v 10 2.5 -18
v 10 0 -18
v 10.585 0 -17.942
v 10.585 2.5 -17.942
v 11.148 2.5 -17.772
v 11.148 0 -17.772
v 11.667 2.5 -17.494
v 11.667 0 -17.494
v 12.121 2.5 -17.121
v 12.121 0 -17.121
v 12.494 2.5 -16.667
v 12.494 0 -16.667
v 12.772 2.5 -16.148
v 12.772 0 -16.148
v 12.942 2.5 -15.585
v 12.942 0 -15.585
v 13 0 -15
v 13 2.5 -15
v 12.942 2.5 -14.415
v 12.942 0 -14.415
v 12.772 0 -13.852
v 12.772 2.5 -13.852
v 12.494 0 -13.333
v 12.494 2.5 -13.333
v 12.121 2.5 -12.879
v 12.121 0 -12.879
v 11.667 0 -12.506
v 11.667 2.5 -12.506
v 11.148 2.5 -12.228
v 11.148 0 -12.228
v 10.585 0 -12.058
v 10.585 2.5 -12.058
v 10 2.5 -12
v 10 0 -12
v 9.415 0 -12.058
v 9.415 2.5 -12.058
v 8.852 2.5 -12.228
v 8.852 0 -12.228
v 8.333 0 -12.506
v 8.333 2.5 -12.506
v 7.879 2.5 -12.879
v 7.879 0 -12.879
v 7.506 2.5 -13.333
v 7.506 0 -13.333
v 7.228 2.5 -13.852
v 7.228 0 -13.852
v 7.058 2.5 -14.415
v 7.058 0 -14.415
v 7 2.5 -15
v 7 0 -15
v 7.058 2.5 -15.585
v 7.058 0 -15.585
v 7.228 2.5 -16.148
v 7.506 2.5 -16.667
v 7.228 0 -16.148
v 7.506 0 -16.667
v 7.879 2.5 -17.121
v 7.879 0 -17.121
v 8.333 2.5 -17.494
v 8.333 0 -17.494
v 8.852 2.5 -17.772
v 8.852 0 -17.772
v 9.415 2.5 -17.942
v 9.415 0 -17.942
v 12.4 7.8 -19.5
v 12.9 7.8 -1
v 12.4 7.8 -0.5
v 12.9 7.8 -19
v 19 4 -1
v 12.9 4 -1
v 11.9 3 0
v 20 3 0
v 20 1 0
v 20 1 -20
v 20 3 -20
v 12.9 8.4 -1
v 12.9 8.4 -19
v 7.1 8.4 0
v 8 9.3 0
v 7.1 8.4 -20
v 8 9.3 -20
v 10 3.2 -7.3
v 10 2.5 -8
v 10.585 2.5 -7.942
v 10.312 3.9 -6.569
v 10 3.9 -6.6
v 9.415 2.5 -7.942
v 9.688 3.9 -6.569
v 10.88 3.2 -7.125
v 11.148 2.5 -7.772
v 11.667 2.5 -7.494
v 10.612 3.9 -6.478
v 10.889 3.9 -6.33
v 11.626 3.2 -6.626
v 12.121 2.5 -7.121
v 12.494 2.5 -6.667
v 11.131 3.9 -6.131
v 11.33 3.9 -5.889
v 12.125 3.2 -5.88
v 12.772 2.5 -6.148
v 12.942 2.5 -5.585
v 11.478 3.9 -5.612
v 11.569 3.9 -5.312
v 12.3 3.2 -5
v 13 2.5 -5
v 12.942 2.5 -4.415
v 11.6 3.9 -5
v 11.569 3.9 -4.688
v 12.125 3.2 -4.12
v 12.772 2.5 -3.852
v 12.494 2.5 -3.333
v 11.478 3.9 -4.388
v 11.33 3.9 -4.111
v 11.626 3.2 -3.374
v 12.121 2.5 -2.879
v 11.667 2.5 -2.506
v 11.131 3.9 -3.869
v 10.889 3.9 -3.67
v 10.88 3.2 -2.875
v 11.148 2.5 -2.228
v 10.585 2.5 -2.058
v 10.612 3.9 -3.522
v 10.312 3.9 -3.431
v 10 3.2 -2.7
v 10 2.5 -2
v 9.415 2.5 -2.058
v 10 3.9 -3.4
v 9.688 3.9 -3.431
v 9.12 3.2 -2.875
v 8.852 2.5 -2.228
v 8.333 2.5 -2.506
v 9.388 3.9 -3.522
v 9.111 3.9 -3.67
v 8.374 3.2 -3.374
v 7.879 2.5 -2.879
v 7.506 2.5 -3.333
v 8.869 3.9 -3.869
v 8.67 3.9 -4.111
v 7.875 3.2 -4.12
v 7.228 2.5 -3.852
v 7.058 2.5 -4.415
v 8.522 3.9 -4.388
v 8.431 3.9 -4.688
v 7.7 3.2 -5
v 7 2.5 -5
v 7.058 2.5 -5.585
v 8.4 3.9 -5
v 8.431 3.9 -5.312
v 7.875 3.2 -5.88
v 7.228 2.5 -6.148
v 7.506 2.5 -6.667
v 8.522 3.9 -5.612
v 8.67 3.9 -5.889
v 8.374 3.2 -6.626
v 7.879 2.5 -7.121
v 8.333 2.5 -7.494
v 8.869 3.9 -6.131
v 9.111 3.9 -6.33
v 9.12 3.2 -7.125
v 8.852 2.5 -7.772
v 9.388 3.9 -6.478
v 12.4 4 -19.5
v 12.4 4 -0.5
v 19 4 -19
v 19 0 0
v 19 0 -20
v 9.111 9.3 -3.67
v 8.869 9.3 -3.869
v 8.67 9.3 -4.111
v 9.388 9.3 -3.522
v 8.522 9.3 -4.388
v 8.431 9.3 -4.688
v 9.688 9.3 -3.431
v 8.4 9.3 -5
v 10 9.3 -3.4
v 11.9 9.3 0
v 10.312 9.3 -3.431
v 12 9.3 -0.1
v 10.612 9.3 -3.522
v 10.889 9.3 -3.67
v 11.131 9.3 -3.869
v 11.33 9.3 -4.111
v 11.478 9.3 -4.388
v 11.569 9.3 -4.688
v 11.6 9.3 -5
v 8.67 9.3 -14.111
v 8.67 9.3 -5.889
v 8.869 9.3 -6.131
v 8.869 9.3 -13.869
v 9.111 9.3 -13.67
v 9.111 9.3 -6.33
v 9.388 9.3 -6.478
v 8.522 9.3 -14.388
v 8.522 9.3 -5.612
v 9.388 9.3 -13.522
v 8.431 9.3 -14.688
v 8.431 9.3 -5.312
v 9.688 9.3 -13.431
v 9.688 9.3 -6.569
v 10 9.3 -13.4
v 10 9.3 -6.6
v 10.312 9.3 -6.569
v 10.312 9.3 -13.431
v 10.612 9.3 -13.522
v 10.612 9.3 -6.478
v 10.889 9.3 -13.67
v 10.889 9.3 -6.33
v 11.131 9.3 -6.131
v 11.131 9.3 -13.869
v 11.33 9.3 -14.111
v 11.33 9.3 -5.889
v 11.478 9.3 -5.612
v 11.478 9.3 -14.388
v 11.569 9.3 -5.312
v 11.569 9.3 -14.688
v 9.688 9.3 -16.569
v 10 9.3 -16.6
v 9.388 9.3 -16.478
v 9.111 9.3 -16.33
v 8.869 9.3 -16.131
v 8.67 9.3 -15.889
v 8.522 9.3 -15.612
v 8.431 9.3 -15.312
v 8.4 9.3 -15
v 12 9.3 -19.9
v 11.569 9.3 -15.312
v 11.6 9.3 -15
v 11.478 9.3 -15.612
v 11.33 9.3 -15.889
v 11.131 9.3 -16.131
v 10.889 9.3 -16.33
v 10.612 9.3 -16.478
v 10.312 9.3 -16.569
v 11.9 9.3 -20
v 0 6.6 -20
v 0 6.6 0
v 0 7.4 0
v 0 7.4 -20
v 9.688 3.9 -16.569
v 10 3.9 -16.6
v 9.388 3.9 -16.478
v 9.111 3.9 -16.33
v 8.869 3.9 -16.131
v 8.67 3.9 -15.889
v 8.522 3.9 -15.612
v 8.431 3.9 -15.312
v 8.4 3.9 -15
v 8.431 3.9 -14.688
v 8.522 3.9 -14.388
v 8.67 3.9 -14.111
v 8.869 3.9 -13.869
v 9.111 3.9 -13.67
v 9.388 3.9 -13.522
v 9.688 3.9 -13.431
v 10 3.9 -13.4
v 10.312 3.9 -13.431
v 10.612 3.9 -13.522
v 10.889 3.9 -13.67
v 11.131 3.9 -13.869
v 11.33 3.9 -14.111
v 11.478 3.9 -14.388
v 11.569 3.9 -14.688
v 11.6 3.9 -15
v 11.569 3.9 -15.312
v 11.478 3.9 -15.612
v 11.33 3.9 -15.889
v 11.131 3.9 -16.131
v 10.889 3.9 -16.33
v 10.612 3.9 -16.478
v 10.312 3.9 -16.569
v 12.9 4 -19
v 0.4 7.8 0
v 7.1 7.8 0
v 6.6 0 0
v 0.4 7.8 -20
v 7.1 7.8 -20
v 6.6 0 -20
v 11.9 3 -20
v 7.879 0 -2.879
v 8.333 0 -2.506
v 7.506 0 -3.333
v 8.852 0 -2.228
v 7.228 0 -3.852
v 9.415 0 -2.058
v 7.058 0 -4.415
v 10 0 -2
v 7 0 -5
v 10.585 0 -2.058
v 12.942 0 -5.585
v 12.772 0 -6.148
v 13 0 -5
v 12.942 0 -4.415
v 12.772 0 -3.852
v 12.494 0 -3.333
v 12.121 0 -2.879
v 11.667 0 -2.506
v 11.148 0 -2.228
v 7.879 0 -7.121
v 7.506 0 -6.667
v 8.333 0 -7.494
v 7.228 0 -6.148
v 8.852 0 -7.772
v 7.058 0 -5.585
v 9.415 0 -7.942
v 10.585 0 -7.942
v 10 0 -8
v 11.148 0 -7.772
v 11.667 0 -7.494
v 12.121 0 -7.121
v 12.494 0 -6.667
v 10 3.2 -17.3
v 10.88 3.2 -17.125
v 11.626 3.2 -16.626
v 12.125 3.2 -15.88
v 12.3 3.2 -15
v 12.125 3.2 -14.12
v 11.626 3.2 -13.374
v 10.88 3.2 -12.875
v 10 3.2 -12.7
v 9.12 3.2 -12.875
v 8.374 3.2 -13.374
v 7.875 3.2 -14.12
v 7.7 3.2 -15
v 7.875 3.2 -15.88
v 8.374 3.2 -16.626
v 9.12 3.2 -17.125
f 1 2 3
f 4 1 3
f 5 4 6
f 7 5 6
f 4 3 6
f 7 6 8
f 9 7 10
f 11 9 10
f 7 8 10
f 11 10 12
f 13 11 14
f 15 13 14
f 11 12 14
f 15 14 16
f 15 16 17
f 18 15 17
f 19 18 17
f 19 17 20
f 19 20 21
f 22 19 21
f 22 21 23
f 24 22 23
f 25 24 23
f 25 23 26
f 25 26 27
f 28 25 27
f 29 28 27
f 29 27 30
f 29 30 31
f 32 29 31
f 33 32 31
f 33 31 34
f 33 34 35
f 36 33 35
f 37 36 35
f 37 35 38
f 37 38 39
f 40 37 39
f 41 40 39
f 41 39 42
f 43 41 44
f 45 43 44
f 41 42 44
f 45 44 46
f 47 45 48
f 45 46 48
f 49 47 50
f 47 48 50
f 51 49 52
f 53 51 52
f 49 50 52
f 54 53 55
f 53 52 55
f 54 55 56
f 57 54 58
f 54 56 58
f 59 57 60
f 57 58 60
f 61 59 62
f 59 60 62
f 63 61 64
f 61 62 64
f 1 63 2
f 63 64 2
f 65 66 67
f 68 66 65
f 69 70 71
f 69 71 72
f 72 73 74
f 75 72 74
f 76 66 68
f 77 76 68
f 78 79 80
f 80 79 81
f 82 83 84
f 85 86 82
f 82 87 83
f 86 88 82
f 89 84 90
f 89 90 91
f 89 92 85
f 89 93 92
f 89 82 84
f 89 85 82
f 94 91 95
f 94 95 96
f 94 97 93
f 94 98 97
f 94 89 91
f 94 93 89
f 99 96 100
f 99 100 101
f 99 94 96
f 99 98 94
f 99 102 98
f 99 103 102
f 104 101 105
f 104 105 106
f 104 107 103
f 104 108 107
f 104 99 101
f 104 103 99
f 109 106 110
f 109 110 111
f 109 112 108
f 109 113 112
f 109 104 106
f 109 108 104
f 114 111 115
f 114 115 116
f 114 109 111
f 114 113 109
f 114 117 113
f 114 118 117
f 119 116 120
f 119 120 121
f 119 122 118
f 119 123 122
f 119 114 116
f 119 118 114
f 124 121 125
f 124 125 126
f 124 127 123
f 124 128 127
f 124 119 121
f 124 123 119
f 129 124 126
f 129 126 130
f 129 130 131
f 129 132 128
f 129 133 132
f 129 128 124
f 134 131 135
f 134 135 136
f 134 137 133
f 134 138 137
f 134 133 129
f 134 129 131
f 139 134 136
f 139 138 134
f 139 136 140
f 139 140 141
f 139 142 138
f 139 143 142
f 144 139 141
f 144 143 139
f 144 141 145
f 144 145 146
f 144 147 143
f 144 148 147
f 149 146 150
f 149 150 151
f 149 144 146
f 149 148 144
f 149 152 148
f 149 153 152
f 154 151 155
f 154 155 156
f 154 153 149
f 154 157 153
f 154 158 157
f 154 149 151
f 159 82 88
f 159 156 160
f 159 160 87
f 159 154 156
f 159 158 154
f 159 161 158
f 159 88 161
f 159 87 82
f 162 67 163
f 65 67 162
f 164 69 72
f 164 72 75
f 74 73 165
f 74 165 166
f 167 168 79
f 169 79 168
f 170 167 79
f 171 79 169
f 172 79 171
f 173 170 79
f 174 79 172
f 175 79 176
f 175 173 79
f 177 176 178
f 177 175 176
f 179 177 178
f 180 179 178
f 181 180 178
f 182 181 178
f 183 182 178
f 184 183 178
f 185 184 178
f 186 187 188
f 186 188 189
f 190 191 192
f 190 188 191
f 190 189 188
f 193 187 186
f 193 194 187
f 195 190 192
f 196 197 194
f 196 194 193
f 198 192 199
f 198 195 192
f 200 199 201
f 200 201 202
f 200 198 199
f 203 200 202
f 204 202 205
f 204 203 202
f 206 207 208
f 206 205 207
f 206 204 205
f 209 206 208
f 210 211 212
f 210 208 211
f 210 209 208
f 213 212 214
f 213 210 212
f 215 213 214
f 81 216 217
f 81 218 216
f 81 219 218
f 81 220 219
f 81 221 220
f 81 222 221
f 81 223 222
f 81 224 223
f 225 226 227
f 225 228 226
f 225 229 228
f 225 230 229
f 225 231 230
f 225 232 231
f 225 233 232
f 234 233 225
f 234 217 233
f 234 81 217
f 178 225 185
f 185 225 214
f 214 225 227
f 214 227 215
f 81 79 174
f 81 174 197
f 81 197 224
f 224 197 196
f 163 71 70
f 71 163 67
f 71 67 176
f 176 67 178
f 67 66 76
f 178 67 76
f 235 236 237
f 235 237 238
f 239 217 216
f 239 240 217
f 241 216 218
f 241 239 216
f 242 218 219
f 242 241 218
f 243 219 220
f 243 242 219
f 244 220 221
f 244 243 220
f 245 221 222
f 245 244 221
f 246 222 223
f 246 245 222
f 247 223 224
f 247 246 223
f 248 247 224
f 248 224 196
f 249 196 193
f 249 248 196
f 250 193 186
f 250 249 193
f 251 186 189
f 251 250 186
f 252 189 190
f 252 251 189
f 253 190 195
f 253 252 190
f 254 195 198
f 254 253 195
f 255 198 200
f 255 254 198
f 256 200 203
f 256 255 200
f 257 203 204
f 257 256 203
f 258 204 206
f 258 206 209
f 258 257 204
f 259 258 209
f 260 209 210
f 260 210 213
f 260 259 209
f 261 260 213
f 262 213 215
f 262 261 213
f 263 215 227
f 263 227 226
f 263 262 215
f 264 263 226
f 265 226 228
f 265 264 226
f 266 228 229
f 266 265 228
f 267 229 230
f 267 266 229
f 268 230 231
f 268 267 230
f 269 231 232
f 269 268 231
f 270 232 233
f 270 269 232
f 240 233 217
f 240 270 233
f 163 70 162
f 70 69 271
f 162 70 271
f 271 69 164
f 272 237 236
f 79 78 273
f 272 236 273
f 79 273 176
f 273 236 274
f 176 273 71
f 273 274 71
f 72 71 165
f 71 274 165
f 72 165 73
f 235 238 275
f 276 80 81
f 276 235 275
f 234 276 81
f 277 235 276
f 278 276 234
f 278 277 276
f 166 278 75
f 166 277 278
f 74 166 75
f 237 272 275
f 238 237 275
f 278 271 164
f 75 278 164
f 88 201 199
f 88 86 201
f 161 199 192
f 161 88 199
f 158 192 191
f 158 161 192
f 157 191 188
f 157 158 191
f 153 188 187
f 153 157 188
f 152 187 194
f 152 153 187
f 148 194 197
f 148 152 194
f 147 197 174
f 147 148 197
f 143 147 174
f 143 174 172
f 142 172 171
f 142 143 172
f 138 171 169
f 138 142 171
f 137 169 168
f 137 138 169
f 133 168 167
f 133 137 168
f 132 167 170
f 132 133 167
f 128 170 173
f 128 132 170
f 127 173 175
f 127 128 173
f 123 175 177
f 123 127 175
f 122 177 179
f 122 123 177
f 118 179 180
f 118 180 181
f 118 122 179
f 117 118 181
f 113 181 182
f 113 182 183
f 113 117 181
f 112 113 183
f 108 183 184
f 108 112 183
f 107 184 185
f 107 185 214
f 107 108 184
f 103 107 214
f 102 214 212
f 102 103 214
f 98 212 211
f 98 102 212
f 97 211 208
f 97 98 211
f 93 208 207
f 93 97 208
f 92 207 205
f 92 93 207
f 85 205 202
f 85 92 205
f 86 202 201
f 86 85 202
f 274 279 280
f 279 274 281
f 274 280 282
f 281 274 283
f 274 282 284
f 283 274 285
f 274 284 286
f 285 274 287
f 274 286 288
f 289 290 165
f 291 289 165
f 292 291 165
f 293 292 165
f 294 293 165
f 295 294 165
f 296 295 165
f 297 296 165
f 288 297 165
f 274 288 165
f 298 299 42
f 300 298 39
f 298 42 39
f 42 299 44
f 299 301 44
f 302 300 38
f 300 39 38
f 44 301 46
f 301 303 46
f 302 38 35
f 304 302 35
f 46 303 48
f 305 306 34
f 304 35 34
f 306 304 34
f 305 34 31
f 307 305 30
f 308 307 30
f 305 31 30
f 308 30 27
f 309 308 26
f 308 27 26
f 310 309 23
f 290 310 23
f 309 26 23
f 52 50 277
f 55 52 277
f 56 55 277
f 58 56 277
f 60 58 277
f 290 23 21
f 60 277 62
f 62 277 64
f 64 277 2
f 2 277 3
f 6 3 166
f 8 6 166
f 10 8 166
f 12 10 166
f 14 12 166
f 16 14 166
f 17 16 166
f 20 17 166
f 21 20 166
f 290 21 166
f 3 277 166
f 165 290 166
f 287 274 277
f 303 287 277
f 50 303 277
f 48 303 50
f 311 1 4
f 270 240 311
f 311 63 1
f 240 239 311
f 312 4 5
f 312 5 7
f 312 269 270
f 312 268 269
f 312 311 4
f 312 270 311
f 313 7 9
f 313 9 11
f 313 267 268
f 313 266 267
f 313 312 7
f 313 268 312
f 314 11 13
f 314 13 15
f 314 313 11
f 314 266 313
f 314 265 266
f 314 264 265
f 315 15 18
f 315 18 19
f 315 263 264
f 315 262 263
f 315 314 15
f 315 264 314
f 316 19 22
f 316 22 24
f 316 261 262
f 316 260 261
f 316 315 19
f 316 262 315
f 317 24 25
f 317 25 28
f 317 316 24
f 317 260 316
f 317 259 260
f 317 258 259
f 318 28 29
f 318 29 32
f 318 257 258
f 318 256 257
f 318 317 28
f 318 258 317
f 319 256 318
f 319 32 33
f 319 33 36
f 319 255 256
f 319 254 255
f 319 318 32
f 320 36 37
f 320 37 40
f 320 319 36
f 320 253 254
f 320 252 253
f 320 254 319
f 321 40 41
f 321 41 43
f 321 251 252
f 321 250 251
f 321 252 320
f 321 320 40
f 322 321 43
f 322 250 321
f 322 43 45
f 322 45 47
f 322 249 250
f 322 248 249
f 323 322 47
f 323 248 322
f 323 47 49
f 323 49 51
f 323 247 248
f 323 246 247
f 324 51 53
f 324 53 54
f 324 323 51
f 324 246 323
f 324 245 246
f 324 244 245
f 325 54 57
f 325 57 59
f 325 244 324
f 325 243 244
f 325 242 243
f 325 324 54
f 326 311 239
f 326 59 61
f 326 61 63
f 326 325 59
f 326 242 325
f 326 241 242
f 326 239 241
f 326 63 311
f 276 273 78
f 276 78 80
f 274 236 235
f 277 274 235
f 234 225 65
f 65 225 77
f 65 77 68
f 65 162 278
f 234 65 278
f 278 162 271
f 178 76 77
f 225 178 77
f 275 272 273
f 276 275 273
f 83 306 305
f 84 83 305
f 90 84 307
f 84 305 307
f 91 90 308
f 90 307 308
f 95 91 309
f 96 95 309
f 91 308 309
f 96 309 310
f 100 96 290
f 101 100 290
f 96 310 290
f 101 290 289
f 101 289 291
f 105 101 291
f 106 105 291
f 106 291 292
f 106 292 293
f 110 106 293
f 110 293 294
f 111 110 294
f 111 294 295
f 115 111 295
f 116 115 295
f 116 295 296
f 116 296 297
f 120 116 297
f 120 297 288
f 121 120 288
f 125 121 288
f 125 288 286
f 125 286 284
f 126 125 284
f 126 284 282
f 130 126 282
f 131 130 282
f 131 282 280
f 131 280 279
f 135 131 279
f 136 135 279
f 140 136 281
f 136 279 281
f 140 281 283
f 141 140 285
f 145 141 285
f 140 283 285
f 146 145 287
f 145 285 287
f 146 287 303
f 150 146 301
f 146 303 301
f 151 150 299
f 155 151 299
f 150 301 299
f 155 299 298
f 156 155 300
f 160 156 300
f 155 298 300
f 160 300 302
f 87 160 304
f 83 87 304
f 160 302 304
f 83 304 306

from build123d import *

# Parameters (mm, degrees)
SKETCH_1_W          = 20
SKETCH_1_H          = 20
EXTRUDE_1_DEPTH     = 4
SKETCH_2_W          = 12.9
SKETCH_2_H          = 20
EXTRUDE_2_DEPTH     = 3.8
SKETCH_3_R          = 1.6
CUT_EXTRUDE_1_DEPTH = 30.340074983
SKETCH_4_W          = 5.8
SKETCH_4_H          = 20
SKETCH_4_R          = 1.6
EXTRUDE_3_DEPTH     = 1.5
SKETCH_5_R          = 3
CUT_EXTRUDE_3_DEPTH = 2.4
CHAMFER_3_SIZE      = 1.5
CHAMFER_1_SIZE      = 6.6
CHAMFER_2_SIZE      = 1
CHAMFER_4_SIZE      = 0.4
CHAMFER_5_SIZE      = 0.9
SKETCH_7_W          = 21.061561739
SKETCH_7_H          = 3.8
CUT_EXTRUDE_6_DEPTH = 0.5


with BuildPart() as part:
    # 草图1 → 凸台-拉伸1 (new body)
    with BuildSketch(Plane(origin=(0, 0, 0), x_dir=(1, 0, 0), z_dir=(0, 1, 0))):
        with Locations((10, 10)):
            Rectangle(SKETCH_1_W, SKETCH_1_H)
    extrude(amount=EXTRUDE_1_DEPTH)

    # 草图2 → 凸台-拉伸2 (add)
    with BuildSketch(Plane(origin=(0, 4, 0), x_dir=(1, 0, 0), z_dir=(0, 1, 0))):
        with Locations((6.45, 10)):
            Rectangle(SKETCH_2_W, SKETCH_2_H)
    extrude(amount=EXTRUDE_2_DEPTH)

    # 草图3 → 切除-拉伸1 (cut, through all)
    with BuildSketch(Plane(origin=(0, 0, 0), x_dir=(-1, 0, 0), z_dir=(0, -1, 0))):
        with Locations(Location((-10, 5, 0), (0, 0, 90))):
            Circle(SKETCH_3_R)
        with Locations(Location((-10, 15, 0), (0, 0, 90))):
            Circle(SKETCH_3_R)
    extrude(amount=-CUT_EXTRUDE_1_DEPTH, mode=Mode.SUBTRACT)

    # 草图4 → 凸台-拉伸3 (add)
    with BuildSketch(Plane(origin=(0, 7.8, 0), x_dir=(1, 0, 0), z_dir=(0, 1, 0))):
        with Locations((10, 10)):
            Rectangle(SKETCH_4_W, SKETCH_4_H)
        with Locations(Location((10, 15, 0), (0, 0, 90))):
            Circle(SKETCH_4_R, mode=Mode.SUBTRACT)
        with Locations(Location((10, 5, 0), (0, 0, 90))):
            Circle(SKETCH_4_R, mode=Mode.SUBTRACT)
    extrude(amount=EXTRUDE_3_DEPTH)

    # 草图5 → 切除-拉伸3 (cut)
    with BuildSketch(Plane(origin=(0, 0, 0), x_dir=(-1, 0, 0), z_dir=(0, -1, 0))):
        with Locations(Location((-10, 5, 0), (0, 0, 90))):
            Circle(SKETCH_5_R)
        with Locations(Location((-10, 15, 0), (0, 0, 90))):
            Circle(SKETCH_5_R)
    extrude(amount=-CUT_EXTRUDE_3_DEPTH, mode=Mode.SUBTRACT)

    # 倒角3
    # the kernel refuses this chamfer: 1.5 mm, written as the material it takes off along each edge
    with BuildSketch(Plane(origin=(10, 2.4, -15), x_dir=(0, 0, -1), z_dir=(-1, 0, 0))) as chamfer_3_piece_1_section:
        Polygon((1.6 + CHAMFER_3_SIZE, 0), (1.6, -CHAMFER_3_SIZE), (1.6, 0), align=None)
    chamfer_3_piece_1 = revolve(axis=Axis((10, 2.4, -15), (0, -1, 0)), mode=Mode.PRIVATE)
    chamfer_3_piece_1 = chamfer_3_piece_1 & Plane(origin=(10, 2.4, -15), x_dir=(0, 0, -1), z_dir=(0, -1, 0)) * Cylinder(3, 13, mode=Mode.PRIVATE)
    add(chamfer_3_piece_1, mode=Mode.SUBTRACT)
    with BuildSketch(Plane(origin=(10, 2.4, -5), x_dir=(0, 0, -1), z_dir=(-1, 0, 0))) as chamfer_3_piece_2_section:
        Polygon((1.6 + CHAMFER_3_SIZE, 0), (1.6, -CHAMFER_3_SIZE), (1.6, 0), align=None)
    chamfer_3_piece_2 = revolve(axis=Axis((10, 2.4, -5), (0, -1, 0)), mode=Mode.PRIVATE)
    chamfer_3_piece_2 = chamfer_3_piece_2 & Plane(origin=(10, 2.4, -5), x_dir=(0, 0, -1), z_dir=(0, -1, 0)) * Cylinder(3, 13, mode=Mode.PRIVATE)
    add(chamfer_3_piece_2, mode=Mode.SUBTRACT)

    # 倒角1
    chamfer_1_edges = [part.edges().sort_by_distance(p)[0] for p in [
        (0, 0, -10),
    ]]
    chamfer(chamfer_1_edges, length=CHAMFER_1_SIZE)

    # 倒角2
    chamfer_2_edges = [part.edges().sort_by_distance(p)[0] for p in [
        (20, 4, -10),
        (16.45, 4, 0),
        (12.9, 6.65, 0),
        (12.9, 6.65, -20),
        (16.45, 4, -20),
        (20, 0, -10),
    ]]
    chamfer(chamfer_2_edges, length=CHAMFER_2_SIZE)

    # 倒角4
    chamfer_4_edges = [part.edges().sort_by_distance(p)[0] for p in [
        (0, 7.8, -10),
    ]]
    chamfer(chamfer_4_edges, length=CHAMFER_4_SIZE)

    # 倒角5
    chamfer_5_edges = [part.edges().sort_by_distance(p)[0] for p in [
        (7.1, 9.3, -10),
        (12.9, 9.3, -10),
    ]]
    chamfer(chamfer_5_edges, length=CHAMFER_5_SIZE)

    # 草图7 → 切除-拉伸6 (cut)
    with BuildSketch(Plane(origin=(12.9, 0, 0), x_dir=(0, 0, -1), z_dir=(1, 0, 0))):
        with Locations((9.469219131, 5.9)):
            Rectangle(SKETCH_7_W, SKETCH_7_H)
    extrude(amount=-CUT_EXTRUDE_6_DEPTH, mode=Mode.SUBTRACT)


solid = part.part
